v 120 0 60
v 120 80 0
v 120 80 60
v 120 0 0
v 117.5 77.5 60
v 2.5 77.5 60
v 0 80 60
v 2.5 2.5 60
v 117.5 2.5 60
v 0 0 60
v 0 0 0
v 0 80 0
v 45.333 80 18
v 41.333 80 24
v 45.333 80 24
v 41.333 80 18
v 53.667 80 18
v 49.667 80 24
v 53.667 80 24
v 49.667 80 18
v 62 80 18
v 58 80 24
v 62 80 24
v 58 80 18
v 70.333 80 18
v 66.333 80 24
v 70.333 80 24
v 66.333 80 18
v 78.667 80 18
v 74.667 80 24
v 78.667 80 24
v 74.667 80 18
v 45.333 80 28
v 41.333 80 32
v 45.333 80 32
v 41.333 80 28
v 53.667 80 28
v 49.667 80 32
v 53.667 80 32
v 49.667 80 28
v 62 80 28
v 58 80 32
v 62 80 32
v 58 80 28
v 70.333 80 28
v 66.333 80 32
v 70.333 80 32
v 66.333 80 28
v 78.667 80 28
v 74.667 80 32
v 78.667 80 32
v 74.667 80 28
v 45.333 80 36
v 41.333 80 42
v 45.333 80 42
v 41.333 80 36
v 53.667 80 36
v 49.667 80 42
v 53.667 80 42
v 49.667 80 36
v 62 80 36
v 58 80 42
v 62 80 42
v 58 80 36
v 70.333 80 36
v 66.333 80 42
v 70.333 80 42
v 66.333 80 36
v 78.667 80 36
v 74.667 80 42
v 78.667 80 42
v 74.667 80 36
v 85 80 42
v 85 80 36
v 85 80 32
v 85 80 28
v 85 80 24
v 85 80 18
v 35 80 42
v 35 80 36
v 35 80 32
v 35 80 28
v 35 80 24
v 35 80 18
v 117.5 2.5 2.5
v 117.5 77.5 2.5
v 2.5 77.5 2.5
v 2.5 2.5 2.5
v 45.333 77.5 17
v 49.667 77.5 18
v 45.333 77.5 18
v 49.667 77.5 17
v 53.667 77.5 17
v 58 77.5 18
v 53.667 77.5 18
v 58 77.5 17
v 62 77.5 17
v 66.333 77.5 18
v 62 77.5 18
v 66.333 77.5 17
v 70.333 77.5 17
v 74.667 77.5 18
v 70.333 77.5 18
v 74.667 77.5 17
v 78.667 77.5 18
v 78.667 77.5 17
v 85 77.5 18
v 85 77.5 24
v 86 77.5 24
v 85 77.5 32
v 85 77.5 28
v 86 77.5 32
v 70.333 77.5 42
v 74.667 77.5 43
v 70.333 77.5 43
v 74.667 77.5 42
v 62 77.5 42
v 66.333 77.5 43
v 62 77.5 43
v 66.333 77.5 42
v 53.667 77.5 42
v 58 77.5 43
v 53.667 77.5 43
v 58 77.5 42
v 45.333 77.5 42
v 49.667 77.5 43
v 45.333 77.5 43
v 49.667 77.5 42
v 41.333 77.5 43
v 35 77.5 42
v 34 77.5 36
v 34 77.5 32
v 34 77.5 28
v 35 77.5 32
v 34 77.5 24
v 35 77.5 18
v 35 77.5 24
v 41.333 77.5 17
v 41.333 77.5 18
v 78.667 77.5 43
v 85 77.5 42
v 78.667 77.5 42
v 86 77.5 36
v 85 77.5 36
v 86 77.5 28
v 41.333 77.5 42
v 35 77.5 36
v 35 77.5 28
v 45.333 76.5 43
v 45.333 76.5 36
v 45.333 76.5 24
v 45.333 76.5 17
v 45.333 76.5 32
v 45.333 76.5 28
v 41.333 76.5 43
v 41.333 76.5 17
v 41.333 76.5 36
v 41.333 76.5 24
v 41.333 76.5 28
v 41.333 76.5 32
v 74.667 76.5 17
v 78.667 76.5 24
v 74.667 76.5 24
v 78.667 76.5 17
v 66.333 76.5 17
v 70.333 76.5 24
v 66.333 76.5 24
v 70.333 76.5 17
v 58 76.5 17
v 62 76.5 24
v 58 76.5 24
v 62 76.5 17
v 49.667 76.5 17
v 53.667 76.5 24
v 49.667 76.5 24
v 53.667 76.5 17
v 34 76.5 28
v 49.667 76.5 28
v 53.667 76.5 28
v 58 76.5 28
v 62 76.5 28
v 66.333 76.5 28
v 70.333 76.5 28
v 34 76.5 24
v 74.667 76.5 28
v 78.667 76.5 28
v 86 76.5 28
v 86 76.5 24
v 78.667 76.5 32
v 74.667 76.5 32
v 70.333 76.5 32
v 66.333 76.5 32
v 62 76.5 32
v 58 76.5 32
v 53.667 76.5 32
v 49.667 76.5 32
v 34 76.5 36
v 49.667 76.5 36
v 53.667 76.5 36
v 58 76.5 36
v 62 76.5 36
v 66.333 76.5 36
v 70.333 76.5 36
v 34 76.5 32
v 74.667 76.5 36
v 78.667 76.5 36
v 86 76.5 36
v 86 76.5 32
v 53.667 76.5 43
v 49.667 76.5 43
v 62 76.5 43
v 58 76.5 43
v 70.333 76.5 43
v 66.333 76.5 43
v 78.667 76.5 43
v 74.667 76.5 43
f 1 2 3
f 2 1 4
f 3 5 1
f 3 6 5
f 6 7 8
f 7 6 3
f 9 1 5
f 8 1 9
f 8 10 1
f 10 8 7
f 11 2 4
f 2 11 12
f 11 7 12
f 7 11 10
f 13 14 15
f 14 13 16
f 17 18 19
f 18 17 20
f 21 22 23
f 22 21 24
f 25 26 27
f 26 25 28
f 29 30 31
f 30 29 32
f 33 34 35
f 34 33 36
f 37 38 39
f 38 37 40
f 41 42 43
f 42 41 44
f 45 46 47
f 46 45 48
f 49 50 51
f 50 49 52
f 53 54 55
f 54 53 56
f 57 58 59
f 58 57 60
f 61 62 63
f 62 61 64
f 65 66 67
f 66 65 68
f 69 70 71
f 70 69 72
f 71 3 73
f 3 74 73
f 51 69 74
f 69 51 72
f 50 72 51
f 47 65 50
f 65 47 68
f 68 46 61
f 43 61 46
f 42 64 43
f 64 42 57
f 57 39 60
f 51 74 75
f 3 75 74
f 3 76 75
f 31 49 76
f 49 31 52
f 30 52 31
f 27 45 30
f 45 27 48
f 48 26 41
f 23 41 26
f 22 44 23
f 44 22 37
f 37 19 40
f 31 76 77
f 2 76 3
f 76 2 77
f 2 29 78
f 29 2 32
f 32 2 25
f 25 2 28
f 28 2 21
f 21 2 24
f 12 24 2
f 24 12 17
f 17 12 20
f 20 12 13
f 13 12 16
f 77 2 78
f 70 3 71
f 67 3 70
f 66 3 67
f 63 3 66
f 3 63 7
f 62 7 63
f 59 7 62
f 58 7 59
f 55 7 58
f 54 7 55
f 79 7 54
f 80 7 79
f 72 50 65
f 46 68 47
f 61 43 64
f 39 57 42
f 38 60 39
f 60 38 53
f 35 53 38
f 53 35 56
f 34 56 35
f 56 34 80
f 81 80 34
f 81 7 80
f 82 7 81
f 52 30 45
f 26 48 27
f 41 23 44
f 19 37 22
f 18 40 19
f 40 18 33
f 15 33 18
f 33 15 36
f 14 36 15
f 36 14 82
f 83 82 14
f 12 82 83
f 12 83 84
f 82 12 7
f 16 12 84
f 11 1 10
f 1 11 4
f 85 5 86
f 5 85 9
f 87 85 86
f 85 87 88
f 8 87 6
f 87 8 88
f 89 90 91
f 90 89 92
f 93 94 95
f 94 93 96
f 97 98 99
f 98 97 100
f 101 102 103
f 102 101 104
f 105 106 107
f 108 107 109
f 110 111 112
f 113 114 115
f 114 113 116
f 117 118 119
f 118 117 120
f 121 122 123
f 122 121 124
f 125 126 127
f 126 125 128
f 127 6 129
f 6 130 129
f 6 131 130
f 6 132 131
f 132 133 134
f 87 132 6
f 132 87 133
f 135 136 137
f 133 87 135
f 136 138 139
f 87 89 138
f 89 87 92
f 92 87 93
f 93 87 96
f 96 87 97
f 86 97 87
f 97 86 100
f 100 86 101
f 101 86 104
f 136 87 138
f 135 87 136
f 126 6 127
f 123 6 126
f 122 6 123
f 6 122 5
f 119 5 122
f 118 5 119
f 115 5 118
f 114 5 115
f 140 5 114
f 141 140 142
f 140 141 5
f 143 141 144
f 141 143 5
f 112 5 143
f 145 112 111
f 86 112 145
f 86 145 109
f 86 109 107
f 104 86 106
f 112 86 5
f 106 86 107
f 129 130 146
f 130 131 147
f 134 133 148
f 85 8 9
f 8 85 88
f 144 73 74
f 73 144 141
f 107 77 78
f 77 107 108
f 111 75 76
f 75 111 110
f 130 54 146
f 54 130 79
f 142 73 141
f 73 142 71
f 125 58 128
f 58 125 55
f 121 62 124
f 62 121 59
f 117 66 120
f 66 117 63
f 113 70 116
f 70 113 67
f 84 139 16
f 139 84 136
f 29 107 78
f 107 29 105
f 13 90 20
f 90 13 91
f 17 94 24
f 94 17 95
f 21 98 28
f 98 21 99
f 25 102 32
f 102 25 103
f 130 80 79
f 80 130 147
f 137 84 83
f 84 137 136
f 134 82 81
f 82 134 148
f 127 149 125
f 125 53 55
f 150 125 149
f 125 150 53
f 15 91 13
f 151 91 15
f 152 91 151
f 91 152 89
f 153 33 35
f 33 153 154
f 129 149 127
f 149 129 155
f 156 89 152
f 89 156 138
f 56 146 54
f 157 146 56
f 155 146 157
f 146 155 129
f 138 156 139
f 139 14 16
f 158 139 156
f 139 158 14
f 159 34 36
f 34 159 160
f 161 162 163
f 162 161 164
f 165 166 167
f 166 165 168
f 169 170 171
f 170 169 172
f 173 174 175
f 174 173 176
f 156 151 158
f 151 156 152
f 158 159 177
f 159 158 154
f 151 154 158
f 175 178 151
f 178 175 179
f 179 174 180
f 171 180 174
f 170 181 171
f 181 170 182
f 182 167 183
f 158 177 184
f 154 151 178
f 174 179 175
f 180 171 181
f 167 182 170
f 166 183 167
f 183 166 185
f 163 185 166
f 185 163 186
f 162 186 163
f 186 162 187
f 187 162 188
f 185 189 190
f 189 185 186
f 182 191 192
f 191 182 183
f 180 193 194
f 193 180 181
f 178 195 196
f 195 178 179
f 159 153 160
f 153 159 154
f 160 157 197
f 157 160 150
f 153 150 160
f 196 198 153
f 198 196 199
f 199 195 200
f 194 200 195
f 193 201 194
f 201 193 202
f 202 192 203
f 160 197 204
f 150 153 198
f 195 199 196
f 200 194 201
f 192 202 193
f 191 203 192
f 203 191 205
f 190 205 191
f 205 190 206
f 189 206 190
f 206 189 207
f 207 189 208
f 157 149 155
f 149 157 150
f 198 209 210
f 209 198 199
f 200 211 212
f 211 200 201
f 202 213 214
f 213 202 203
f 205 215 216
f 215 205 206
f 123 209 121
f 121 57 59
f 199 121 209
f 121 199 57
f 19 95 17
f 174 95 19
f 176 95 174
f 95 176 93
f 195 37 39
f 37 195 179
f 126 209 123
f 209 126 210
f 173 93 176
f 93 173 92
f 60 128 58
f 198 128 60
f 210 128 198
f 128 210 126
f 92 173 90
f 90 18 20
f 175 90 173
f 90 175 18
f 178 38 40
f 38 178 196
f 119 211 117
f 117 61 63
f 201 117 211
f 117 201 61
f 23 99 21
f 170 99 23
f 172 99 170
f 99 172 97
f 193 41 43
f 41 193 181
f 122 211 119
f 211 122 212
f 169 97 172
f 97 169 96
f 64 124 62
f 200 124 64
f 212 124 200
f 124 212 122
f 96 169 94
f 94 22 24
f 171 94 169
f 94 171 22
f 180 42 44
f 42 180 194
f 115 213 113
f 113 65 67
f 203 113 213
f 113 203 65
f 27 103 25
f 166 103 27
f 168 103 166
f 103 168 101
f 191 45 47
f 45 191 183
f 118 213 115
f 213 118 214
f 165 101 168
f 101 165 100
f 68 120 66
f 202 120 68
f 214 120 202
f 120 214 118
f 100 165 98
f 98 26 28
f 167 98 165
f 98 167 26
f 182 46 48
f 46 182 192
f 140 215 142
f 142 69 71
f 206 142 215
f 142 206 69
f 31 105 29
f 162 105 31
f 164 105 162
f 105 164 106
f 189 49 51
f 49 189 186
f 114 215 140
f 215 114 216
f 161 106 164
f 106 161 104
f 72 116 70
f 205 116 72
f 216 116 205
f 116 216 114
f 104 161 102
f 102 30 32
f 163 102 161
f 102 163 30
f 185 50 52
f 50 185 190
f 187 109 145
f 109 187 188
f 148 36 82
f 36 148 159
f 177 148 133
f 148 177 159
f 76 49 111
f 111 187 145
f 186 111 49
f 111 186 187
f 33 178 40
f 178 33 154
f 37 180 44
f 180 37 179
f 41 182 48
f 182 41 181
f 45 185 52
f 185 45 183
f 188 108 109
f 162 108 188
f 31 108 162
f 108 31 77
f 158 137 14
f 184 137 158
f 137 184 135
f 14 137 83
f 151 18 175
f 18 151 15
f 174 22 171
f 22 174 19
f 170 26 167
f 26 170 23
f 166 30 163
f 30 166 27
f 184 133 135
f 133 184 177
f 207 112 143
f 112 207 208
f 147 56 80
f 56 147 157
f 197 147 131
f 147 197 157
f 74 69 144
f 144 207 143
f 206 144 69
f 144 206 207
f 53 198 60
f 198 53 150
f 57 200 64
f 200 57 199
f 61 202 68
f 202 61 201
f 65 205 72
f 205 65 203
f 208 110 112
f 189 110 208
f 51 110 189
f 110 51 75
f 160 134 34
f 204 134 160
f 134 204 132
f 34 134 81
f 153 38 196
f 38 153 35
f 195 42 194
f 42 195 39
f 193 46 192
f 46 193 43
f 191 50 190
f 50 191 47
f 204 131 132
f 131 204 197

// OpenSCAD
$fn = 32;

// ----------------------------------------------------------------------
// Vent box: crossgrid enclosure
// ----------------------------------------------------------------------

// --- parameters (mm) ---
box_l = 120;              // box length, X
box_w = 80;               // box width, Y
box_h = 60;               // box height, Z
wall_t = 2.5;             // shell wall thickness
win_l = 50;               // vent window width, X
win_h = 24;               // vent window height, Z
bar_w = 4;                // grid bar width
n_v = 5;                  // vertical bar count
n_h = 2;                  // horizontal bar count

win_z0 = (box_h - win_h) / 2;  // window lower edge Z
v_step = win_l / (n_v + 1);  // vertical bar step
h_step = win_h / (n_h + 1);  // horizontal bar step

difference() {
  union() {
    difference() {
      cube([box_l, box_w, box_h]);
  translate([wall_t, wall_t, wall_t])
    cube([box_l - 2 * wall_t, box_w - 2 * wall_t, box_h]);
  translate([(box_l - win_l) / 2, box_w - wall_t - 1, win_z0])
    cube([win_l, wall_t + 2, win_h]);
    }
    for (i = [1 : n_v])
      translate([(box_l - win_l) / 2 + i * v_step - bar_w / 2,
                 box_w - wall_t - 1, win_z0 - 1])
        cube([bar_w, wall_t + 1, win_h + 2]);
    for (i = [1 : n_h])
      translate([(box_l - win_l) / 2 - 1, box_w - wall_t - 1,
                 win_z0 + i * h_step - bar_w / 2])
        cube([win_l + 2, wall_t + 1, bar_w]);
  }
}
